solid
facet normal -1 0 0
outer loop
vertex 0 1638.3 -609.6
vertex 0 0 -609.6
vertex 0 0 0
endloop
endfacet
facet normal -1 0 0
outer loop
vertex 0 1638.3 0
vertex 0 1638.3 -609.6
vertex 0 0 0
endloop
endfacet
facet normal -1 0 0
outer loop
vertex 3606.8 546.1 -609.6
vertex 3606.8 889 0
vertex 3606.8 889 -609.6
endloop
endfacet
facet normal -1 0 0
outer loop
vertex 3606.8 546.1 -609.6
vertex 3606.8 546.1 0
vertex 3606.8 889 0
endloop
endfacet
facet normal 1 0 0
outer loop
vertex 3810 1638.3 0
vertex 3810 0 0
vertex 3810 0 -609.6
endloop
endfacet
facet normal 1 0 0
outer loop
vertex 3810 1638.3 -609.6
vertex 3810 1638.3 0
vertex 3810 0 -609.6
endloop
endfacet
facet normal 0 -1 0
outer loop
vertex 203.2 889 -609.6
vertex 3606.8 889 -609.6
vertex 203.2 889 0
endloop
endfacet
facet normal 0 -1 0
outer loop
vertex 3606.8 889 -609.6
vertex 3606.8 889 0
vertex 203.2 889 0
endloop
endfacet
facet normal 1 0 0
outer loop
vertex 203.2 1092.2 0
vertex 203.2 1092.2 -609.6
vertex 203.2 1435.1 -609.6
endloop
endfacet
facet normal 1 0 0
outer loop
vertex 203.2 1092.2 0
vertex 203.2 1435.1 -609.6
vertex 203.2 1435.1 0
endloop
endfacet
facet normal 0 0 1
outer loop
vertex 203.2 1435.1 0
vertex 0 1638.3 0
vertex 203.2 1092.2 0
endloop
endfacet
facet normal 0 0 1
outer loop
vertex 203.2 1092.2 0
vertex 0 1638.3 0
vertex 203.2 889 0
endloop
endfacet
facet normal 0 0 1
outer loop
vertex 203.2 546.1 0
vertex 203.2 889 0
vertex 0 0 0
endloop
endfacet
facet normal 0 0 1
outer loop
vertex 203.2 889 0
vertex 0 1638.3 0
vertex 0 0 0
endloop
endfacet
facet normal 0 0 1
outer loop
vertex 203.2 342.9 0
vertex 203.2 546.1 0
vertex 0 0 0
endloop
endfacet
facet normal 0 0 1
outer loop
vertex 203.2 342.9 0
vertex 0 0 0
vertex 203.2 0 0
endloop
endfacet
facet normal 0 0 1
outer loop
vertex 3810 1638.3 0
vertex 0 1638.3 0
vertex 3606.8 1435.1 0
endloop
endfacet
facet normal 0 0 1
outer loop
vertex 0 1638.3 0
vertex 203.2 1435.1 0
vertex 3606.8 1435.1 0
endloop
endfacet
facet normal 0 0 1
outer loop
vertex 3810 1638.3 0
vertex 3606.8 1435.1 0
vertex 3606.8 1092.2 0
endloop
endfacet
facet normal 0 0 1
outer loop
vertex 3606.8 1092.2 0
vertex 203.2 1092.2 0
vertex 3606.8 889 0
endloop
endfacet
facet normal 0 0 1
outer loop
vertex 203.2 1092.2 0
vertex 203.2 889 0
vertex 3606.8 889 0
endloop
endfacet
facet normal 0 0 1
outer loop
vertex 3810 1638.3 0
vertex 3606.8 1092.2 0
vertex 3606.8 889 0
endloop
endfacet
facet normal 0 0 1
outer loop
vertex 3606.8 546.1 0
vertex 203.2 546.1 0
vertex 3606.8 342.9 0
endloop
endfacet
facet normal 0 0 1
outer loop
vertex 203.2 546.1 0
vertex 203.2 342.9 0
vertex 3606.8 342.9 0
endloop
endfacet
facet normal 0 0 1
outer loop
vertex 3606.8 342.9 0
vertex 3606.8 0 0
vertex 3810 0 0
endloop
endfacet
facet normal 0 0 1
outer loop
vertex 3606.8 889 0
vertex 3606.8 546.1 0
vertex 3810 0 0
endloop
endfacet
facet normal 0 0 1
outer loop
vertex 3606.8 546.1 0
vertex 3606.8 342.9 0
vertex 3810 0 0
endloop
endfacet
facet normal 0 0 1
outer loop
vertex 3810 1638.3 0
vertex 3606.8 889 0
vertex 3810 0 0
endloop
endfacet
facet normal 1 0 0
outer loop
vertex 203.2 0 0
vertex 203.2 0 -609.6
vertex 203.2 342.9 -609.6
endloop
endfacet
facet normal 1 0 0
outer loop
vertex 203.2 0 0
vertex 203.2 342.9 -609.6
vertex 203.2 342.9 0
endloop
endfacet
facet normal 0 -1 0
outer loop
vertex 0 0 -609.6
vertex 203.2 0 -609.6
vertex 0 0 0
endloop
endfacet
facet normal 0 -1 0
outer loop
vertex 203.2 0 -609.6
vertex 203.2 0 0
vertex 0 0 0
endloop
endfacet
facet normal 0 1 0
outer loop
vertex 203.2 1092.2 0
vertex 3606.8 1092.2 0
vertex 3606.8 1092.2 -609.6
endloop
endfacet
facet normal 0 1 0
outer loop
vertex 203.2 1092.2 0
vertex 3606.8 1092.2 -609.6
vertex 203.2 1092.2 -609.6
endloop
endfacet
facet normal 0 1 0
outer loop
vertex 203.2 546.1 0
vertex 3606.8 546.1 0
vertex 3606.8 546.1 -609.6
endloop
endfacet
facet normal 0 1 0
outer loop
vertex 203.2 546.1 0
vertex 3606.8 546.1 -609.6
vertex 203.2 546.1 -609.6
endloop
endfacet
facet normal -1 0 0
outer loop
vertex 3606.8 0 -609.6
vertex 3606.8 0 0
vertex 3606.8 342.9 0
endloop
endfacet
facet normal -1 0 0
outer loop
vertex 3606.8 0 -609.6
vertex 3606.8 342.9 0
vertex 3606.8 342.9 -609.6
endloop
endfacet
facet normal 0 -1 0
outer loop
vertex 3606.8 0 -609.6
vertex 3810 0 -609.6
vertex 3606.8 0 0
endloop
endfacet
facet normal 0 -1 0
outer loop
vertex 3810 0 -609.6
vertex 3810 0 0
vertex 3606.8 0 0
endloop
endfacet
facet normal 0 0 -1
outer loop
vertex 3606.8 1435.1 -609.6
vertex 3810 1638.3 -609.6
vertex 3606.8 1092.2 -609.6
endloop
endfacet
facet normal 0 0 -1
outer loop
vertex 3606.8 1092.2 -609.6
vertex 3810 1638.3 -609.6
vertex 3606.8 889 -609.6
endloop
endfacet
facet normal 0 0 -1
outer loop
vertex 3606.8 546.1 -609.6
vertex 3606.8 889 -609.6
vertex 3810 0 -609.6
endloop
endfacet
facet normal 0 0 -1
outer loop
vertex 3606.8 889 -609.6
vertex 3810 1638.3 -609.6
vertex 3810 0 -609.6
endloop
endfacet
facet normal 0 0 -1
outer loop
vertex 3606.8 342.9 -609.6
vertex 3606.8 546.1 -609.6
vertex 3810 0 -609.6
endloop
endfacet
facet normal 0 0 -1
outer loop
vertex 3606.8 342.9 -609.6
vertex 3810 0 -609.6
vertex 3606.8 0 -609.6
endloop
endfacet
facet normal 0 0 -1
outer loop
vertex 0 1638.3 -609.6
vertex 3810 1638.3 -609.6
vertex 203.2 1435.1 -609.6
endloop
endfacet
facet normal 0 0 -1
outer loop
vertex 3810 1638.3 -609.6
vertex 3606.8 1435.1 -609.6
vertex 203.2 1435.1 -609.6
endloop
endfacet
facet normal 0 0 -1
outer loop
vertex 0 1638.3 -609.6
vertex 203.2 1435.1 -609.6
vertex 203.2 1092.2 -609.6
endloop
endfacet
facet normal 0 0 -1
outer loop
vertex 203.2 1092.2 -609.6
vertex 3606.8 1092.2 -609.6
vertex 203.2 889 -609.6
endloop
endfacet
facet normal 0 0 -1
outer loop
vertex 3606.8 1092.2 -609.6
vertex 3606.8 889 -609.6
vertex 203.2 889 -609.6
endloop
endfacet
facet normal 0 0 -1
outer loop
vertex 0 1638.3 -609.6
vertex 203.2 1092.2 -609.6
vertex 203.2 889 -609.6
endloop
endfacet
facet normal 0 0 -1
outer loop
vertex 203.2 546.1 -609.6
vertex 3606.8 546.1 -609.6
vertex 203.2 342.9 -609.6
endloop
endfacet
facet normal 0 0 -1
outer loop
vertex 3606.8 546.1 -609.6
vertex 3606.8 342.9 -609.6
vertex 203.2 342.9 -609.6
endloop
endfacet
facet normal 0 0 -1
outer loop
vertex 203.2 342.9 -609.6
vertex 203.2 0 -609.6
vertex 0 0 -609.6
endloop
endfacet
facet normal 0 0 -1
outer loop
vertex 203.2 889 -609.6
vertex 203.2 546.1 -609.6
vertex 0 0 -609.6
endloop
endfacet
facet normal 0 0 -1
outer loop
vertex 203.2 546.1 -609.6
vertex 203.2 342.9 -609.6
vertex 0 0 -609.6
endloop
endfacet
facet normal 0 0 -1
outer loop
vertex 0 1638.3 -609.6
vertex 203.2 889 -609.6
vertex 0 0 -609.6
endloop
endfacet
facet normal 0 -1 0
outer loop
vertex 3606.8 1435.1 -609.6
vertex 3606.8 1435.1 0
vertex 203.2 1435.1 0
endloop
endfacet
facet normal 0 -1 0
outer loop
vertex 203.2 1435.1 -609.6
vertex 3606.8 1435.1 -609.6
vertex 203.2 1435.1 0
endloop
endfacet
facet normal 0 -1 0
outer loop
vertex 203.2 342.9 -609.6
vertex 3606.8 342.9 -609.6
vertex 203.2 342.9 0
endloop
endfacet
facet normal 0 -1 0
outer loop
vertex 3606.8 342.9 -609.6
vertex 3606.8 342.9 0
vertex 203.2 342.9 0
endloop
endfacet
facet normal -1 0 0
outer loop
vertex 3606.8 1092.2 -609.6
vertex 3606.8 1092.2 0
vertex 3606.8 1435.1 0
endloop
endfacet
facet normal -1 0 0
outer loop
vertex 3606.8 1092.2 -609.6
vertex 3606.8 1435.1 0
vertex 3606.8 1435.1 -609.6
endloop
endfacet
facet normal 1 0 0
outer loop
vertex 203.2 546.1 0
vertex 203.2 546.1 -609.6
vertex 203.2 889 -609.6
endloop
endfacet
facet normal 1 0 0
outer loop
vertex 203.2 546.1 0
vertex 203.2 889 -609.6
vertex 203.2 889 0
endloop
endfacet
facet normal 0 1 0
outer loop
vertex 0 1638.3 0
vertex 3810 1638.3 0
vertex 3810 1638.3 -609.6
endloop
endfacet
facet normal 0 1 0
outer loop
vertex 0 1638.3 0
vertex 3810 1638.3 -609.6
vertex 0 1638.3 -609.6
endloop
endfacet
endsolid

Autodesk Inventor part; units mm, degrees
ref_plane "YZ Plane" through (0, 0, 0) normal (1, 0, 0) x (0, 1, 0)
ref_plane "XZ Plane" through (0, 0, 0) normal (0, 1, 0) x (-1, 0, 0)
ref_plane "XY Plane" through (0, 0, 0) normal (0, 0, 1) x (1, 0, 0)
sketch "Sketch2" plane through (0, 0, 0) normal (0, 1, 0) x (-1, 0, 0)
  line L0 (0, 0) -> (-3810, 0)
  line L1 (-3810, 0) -> (-3810, -609.6)
  line L2 (-3810, -609.6) -> (0, -609.6)
  line L3 (0, -609.6) -> (0, 0)
  dimension "d2" = 609.6
  dimension "d3" = 3810
extrude "Extrusion1" add sketch "Sketch2" along normal blind 546.1
shell "Shell1" thickness 203.2 removed faces 3 at (1270, 364.0667, 0) at (2540, 364.0667, -609.6) at (2540, 0, -203.2)
pattern_linear "Rectangular Pattern1" count 3 spacing 546.1 along (0, 1, 0)
equation "\"d4\" = shelfheight"
equation "\"d8\" = shelfheight"
equation "\"totalheight\" = 1638.3"
equation "\"shelfheight\" = 546.1"
properties part number "Large Shelves"
